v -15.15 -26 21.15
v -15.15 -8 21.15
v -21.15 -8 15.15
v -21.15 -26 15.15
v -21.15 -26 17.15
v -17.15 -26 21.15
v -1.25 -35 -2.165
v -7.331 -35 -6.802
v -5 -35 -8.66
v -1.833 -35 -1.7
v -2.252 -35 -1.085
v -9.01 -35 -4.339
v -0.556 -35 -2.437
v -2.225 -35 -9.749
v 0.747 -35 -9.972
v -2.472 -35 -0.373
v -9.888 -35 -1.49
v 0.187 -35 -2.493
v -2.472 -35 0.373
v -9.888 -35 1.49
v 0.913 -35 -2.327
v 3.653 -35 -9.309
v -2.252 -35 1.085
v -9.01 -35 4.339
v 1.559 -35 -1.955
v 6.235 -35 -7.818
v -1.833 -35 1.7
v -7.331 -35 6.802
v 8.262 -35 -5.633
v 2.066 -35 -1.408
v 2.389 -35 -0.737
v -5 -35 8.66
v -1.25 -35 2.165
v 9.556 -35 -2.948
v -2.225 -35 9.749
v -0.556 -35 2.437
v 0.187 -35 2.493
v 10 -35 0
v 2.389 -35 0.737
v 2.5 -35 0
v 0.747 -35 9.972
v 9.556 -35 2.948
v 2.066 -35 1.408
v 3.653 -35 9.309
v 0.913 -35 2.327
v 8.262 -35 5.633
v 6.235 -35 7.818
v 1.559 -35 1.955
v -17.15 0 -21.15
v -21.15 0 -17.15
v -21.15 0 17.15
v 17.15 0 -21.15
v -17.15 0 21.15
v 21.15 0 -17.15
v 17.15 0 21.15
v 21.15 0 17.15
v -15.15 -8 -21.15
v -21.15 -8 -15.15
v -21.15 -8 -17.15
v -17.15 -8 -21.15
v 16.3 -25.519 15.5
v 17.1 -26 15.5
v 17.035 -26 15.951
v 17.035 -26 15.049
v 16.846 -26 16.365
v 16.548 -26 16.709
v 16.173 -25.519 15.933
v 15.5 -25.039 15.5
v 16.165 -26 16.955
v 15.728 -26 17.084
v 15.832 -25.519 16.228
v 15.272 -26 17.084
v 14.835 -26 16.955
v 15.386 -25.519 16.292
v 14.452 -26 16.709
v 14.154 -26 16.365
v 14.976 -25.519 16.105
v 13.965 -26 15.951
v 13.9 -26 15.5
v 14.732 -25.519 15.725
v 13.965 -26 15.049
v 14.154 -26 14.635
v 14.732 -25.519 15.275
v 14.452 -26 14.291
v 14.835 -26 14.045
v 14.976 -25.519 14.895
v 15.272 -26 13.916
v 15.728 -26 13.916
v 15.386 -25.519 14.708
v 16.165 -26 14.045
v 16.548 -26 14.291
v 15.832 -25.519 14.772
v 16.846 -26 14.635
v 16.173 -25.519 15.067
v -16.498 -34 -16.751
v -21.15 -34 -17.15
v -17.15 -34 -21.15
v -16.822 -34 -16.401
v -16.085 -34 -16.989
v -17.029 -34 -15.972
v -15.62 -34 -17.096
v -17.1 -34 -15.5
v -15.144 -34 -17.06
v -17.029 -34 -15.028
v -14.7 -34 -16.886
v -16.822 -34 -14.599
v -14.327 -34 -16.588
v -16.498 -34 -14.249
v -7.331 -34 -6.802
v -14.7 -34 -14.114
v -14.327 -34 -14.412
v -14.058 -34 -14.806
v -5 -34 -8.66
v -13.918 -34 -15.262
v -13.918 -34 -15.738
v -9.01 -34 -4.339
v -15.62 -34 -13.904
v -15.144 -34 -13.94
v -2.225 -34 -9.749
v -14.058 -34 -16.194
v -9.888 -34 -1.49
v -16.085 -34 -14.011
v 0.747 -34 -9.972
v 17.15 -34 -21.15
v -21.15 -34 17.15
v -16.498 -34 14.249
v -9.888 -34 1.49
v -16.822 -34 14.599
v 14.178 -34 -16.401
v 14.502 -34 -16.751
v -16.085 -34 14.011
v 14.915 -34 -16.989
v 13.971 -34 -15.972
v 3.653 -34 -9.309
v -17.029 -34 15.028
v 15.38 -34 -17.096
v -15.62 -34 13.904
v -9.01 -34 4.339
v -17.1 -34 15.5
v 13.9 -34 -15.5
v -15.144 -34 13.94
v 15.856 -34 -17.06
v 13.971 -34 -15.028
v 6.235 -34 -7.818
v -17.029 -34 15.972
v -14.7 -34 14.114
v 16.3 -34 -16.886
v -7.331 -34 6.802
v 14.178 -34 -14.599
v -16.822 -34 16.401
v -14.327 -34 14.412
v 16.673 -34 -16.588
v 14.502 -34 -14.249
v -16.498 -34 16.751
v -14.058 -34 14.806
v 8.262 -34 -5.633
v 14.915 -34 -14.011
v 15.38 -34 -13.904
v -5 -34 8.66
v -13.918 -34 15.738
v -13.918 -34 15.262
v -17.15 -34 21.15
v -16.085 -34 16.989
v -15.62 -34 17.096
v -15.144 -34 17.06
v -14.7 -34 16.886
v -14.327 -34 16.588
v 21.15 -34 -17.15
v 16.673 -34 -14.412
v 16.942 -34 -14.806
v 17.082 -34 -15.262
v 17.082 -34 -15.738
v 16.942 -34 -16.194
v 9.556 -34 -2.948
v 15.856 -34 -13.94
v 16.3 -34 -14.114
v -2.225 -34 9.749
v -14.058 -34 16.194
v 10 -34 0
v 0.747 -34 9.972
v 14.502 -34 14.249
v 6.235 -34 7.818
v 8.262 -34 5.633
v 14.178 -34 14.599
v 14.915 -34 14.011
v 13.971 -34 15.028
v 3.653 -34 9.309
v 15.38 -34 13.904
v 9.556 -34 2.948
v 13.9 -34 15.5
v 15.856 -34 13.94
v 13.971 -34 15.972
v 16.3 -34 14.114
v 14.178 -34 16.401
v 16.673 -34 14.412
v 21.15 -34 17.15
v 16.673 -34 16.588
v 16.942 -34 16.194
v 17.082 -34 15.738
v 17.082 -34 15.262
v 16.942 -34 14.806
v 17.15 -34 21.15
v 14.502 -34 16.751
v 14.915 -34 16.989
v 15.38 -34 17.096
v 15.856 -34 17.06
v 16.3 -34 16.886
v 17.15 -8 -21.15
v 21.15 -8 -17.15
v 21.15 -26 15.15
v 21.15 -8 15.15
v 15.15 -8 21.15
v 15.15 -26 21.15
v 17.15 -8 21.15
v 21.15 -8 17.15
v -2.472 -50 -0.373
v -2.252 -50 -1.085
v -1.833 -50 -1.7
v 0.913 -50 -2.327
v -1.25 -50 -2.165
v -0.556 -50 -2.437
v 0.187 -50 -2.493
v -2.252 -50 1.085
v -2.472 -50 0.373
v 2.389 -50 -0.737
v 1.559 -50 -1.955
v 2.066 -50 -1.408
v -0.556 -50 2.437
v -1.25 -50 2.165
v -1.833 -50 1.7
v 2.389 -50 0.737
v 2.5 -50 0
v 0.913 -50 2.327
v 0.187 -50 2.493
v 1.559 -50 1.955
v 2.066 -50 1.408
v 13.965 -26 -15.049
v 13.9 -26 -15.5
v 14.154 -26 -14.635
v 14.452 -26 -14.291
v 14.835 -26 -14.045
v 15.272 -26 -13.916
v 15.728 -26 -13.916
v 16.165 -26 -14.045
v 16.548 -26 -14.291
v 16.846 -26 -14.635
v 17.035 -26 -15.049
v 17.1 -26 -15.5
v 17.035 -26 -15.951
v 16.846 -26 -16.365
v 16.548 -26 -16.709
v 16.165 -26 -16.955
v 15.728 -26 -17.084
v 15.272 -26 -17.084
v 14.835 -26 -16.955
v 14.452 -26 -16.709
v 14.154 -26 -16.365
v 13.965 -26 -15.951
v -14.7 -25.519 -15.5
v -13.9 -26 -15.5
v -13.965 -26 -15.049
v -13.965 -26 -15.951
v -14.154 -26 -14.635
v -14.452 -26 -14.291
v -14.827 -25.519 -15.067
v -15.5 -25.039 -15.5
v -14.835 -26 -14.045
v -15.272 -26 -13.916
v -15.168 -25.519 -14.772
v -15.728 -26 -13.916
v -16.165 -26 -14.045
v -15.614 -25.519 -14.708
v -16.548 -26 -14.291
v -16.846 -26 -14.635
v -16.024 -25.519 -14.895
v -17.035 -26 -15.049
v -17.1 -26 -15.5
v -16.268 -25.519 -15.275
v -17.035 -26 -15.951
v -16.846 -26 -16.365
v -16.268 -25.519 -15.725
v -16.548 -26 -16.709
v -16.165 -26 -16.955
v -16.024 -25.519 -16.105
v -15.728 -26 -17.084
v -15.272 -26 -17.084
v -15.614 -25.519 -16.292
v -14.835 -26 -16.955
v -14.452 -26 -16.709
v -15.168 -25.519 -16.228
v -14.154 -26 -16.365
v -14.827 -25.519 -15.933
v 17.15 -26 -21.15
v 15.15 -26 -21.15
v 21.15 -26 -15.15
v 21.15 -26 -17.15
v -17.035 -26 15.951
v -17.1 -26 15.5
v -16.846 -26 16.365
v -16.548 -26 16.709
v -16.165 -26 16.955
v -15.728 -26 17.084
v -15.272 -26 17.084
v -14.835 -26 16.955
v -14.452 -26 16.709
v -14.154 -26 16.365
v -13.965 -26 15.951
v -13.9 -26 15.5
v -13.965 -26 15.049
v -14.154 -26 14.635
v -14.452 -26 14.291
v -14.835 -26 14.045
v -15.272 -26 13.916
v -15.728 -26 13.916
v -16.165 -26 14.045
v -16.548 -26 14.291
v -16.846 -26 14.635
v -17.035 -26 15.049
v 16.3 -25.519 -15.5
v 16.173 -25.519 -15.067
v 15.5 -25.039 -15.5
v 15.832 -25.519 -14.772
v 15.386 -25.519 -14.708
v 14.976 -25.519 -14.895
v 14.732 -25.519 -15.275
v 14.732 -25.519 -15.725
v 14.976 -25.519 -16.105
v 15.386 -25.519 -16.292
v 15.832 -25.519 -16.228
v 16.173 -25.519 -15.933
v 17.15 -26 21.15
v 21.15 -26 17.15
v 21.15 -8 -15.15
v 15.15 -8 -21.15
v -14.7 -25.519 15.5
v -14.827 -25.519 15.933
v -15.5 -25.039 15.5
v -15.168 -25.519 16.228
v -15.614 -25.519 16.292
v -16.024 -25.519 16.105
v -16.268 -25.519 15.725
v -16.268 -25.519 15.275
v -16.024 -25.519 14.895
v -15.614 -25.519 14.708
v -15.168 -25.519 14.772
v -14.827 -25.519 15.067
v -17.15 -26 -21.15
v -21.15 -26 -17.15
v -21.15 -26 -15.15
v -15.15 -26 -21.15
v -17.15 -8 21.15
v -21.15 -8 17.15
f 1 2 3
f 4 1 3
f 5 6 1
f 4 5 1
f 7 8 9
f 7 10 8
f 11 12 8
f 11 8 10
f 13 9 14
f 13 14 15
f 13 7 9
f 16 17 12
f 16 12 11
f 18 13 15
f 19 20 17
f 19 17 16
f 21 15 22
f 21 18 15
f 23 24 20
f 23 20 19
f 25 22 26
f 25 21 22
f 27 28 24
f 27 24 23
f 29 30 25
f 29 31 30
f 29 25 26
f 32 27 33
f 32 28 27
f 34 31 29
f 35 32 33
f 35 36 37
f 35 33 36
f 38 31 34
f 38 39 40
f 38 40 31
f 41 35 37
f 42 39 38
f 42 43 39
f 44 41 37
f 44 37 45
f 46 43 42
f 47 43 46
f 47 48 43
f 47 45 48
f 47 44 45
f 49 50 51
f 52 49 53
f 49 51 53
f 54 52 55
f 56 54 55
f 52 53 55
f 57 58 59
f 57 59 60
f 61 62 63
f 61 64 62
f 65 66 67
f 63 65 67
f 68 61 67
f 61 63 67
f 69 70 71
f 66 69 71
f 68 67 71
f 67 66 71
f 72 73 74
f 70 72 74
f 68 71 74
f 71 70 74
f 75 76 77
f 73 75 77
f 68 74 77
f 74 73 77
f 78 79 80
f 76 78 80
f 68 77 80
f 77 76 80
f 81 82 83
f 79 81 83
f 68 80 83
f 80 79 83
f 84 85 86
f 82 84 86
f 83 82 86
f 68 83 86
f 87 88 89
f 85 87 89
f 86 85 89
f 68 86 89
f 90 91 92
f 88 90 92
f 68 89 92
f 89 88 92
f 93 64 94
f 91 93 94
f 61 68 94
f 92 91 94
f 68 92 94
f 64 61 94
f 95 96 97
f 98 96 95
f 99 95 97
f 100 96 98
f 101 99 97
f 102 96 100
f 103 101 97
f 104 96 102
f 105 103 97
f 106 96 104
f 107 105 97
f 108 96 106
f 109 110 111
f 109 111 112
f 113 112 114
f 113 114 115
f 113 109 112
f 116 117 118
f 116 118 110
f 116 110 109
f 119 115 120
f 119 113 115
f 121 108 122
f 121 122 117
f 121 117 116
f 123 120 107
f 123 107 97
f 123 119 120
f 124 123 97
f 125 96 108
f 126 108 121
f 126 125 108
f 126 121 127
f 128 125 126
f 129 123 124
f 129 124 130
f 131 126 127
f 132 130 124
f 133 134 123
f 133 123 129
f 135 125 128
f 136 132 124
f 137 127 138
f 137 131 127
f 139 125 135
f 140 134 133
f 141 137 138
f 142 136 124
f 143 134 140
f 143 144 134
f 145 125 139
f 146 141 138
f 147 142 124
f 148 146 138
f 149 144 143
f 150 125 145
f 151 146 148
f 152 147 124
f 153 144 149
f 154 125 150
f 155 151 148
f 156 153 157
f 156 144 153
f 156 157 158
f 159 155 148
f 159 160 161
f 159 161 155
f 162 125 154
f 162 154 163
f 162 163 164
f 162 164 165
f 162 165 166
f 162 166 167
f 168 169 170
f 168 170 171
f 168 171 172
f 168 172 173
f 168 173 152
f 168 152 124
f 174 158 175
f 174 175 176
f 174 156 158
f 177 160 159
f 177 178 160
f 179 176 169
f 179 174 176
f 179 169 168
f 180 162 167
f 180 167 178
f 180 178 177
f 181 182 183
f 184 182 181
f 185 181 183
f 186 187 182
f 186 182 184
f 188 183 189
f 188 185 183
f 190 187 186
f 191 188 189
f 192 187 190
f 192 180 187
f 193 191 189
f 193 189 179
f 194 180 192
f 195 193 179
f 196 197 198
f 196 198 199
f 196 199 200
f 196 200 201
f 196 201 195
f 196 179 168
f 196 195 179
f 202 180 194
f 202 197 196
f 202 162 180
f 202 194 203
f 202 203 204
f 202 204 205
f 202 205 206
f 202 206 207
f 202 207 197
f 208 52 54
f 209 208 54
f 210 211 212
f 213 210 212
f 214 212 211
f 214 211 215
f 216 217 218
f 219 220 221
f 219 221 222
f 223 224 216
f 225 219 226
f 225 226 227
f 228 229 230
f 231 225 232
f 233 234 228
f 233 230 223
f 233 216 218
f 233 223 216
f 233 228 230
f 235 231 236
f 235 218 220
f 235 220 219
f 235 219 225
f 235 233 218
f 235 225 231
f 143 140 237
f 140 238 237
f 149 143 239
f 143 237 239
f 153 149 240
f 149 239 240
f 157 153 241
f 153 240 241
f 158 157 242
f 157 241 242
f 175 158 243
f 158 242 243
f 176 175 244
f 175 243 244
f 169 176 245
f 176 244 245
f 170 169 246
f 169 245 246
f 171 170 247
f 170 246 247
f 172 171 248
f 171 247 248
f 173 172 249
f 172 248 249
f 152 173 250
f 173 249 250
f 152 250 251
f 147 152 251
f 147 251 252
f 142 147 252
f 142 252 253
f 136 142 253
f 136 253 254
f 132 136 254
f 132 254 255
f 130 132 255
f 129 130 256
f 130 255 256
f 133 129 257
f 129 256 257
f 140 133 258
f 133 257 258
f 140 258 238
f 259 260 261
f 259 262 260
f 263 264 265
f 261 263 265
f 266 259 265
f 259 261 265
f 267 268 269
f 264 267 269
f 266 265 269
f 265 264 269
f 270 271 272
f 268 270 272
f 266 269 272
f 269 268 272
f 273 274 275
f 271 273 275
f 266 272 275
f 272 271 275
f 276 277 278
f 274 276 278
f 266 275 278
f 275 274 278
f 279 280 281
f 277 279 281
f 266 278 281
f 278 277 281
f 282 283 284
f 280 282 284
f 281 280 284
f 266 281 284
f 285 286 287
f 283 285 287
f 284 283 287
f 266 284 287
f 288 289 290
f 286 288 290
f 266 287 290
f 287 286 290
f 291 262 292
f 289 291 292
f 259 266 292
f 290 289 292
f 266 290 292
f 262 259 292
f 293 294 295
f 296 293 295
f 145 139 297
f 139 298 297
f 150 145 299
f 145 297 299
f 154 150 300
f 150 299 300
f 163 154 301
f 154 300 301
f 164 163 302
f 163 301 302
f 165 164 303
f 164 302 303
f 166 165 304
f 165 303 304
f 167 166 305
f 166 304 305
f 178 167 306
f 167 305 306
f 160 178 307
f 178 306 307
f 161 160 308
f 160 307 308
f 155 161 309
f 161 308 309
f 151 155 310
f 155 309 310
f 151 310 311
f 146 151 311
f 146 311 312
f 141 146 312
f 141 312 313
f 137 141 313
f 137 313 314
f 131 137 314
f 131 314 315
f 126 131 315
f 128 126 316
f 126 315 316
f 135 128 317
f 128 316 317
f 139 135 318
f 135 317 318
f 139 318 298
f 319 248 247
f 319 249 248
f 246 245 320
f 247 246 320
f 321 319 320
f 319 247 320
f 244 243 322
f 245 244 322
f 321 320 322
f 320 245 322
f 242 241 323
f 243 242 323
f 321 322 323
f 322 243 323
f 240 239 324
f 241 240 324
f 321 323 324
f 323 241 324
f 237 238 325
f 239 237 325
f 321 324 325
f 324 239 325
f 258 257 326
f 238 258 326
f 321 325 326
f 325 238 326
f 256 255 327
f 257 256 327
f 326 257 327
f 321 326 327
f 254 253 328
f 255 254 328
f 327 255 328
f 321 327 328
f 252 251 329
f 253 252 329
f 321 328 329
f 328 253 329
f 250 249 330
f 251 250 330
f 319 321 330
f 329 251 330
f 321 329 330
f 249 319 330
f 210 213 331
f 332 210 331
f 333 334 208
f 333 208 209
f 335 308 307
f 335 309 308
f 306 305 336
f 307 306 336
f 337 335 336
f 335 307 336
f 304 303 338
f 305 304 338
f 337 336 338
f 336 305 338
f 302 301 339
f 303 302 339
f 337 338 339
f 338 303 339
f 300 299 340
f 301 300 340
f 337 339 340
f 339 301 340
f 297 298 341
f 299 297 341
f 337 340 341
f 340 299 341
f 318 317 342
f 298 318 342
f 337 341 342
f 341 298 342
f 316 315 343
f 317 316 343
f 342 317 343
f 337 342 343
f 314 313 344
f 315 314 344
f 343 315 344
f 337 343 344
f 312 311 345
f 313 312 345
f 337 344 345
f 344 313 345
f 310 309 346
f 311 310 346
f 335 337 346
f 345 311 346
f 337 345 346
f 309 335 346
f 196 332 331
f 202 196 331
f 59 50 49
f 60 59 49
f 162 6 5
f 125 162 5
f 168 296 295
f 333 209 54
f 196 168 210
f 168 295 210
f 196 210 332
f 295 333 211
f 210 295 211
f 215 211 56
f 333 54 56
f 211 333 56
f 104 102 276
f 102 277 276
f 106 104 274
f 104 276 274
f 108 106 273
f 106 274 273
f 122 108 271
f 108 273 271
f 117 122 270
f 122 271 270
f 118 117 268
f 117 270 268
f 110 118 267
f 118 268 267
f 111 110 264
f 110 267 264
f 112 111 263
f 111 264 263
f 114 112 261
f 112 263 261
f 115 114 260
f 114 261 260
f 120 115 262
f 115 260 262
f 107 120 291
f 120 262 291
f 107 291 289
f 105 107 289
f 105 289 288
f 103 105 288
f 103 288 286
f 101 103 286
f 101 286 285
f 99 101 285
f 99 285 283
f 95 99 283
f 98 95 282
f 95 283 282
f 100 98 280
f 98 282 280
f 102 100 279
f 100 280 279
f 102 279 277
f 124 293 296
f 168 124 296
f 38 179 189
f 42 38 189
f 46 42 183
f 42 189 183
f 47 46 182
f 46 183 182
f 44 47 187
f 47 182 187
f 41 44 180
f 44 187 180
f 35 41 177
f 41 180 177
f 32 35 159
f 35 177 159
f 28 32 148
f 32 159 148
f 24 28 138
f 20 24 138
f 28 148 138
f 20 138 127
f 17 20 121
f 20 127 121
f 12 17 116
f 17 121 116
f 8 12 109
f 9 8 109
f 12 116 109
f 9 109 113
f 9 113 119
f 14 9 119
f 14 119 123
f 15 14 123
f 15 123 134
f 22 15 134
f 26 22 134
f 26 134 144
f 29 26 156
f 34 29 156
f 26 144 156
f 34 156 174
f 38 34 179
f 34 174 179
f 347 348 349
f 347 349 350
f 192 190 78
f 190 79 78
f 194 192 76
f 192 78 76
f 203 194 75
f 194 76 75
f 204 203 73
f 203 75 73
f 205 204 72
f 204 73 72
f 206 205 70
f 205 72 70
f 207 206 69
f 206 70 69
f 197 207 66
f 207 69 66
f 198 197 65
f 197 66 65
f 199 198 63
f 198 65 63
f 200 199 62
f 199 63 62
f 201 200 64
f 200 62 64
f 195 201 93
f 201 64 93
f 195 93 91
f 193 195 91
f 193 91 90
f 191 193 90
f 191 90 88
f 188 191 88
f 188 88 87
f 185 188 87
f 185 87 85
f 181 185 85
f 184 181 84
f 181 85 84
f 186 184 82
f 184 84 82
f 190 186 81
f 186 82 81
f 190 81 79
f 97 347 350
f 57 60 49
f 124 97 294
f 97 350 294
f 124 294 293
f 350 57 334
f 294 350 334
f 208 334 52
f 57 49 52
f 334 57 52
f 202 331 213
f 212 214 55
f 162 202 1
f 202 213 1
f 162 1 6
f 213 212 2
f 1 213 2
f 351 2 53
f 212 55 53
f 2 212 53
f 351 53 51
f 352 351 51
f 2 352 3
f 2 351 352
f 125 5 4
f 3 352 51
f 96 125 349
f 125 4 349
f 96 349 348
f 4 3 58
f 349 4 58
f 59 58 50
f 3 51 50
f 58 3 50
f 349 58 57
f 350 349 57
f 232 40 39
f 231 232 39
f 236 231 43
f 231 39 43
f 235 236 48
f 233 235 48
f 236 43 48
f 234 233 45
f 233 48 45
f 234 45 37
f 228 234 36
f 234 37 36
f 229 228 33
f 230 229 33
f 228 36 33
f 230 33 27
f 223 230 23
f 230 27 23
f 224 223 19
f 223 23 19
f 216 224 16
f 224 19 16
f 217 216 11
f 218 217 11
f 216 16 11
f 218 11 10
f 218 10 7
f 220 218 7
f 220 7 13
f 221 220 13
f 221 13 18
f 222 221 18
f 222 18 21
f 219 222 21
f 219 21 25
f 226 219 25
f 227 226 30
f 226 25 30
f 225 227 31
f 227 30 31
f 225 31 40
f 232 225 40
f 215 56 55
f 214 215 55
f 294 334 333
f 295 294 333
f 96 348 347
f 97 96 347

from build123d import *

# Parameters (mm, degrees)
F1_DEPTH  = 8
F3_DEPTH  = 18
F5_DEPTH  = 8
F6_R      = 10
F7_DEPTH  = 1
F9_D      = 3.2
F9_DEPTH  = 8
F9_TIP    = 0.9613769904
F10_R     = 2.5
F11_DEPTH = 15


with BuildPart() as f1:
    # F0 (on Front) → F1 (new body)
    with BuildSketch(Plane.XZ):
        Polygon((-21.15, -17.15), (-17.15, -21.15), (17.15, -21.15), (21.15, -17.15), (21.15, 17.15), (17.15, 21.15), (-17.15, 21.15), (-21.15, 17.15), align=None)
    extrude(amount=F1_DEPTH)

    # F2 (on face) → F3 (join)
    with BuildSketch(Plane.XZ.offset(8)):
        Polygon((-21.15, 15.15), (-21.15, -15.15), (-15.15, -21.15), (15.15, -21.15), (21.15, -15.15), (21.15, 15.15), (15.15, 21.15), (-15.15, 21.15), align=None)
    extrude(amount=F3_DEPTH)

    # F4 (on face) → F5 (join)
    with BuildSketch(Plane.XZ.offset(26)):
        Polygon((-21.15, 17.15), (-21.15, -17.15), (-17.15, -21.15), (17.15, -21.15), (21.15, -17.15), (21.15, 17.15), (17.15, 21.15), (-17.15, 21.15), align=None)
    extrude(amount=F5_DEPTH)

    # F6 (on face) → F7 (join)
    with BuildSketch(Plane.XZ.offset(34)):
        Circle(F6_R)
    extrude(amount=F7_DEPTH)

    # F9
    with Locations(Plane.XZ.offset(34)):
        with Locations((-15.5, 15.5), (15.5, 15.5), (15.5, -15.5), (-15.5, -15.5)):
            Hole(F9_D / 2, depth=F9_DEPTH)
            with Locations((0, 0, -(F9_DEPTH + F9_TIP / 2))):  # 118° drill point
                Cone(0, F9_D / 2, F9_TIP, mode=Mode.SUBTRACT)

    # F10 (on face) → F11 (join)
    with BuildSketch(Plane.XZ.offset(35)):
        Circle(F10_R)
    extrude(amount=F11_DEPTH)


solid = f1.part
